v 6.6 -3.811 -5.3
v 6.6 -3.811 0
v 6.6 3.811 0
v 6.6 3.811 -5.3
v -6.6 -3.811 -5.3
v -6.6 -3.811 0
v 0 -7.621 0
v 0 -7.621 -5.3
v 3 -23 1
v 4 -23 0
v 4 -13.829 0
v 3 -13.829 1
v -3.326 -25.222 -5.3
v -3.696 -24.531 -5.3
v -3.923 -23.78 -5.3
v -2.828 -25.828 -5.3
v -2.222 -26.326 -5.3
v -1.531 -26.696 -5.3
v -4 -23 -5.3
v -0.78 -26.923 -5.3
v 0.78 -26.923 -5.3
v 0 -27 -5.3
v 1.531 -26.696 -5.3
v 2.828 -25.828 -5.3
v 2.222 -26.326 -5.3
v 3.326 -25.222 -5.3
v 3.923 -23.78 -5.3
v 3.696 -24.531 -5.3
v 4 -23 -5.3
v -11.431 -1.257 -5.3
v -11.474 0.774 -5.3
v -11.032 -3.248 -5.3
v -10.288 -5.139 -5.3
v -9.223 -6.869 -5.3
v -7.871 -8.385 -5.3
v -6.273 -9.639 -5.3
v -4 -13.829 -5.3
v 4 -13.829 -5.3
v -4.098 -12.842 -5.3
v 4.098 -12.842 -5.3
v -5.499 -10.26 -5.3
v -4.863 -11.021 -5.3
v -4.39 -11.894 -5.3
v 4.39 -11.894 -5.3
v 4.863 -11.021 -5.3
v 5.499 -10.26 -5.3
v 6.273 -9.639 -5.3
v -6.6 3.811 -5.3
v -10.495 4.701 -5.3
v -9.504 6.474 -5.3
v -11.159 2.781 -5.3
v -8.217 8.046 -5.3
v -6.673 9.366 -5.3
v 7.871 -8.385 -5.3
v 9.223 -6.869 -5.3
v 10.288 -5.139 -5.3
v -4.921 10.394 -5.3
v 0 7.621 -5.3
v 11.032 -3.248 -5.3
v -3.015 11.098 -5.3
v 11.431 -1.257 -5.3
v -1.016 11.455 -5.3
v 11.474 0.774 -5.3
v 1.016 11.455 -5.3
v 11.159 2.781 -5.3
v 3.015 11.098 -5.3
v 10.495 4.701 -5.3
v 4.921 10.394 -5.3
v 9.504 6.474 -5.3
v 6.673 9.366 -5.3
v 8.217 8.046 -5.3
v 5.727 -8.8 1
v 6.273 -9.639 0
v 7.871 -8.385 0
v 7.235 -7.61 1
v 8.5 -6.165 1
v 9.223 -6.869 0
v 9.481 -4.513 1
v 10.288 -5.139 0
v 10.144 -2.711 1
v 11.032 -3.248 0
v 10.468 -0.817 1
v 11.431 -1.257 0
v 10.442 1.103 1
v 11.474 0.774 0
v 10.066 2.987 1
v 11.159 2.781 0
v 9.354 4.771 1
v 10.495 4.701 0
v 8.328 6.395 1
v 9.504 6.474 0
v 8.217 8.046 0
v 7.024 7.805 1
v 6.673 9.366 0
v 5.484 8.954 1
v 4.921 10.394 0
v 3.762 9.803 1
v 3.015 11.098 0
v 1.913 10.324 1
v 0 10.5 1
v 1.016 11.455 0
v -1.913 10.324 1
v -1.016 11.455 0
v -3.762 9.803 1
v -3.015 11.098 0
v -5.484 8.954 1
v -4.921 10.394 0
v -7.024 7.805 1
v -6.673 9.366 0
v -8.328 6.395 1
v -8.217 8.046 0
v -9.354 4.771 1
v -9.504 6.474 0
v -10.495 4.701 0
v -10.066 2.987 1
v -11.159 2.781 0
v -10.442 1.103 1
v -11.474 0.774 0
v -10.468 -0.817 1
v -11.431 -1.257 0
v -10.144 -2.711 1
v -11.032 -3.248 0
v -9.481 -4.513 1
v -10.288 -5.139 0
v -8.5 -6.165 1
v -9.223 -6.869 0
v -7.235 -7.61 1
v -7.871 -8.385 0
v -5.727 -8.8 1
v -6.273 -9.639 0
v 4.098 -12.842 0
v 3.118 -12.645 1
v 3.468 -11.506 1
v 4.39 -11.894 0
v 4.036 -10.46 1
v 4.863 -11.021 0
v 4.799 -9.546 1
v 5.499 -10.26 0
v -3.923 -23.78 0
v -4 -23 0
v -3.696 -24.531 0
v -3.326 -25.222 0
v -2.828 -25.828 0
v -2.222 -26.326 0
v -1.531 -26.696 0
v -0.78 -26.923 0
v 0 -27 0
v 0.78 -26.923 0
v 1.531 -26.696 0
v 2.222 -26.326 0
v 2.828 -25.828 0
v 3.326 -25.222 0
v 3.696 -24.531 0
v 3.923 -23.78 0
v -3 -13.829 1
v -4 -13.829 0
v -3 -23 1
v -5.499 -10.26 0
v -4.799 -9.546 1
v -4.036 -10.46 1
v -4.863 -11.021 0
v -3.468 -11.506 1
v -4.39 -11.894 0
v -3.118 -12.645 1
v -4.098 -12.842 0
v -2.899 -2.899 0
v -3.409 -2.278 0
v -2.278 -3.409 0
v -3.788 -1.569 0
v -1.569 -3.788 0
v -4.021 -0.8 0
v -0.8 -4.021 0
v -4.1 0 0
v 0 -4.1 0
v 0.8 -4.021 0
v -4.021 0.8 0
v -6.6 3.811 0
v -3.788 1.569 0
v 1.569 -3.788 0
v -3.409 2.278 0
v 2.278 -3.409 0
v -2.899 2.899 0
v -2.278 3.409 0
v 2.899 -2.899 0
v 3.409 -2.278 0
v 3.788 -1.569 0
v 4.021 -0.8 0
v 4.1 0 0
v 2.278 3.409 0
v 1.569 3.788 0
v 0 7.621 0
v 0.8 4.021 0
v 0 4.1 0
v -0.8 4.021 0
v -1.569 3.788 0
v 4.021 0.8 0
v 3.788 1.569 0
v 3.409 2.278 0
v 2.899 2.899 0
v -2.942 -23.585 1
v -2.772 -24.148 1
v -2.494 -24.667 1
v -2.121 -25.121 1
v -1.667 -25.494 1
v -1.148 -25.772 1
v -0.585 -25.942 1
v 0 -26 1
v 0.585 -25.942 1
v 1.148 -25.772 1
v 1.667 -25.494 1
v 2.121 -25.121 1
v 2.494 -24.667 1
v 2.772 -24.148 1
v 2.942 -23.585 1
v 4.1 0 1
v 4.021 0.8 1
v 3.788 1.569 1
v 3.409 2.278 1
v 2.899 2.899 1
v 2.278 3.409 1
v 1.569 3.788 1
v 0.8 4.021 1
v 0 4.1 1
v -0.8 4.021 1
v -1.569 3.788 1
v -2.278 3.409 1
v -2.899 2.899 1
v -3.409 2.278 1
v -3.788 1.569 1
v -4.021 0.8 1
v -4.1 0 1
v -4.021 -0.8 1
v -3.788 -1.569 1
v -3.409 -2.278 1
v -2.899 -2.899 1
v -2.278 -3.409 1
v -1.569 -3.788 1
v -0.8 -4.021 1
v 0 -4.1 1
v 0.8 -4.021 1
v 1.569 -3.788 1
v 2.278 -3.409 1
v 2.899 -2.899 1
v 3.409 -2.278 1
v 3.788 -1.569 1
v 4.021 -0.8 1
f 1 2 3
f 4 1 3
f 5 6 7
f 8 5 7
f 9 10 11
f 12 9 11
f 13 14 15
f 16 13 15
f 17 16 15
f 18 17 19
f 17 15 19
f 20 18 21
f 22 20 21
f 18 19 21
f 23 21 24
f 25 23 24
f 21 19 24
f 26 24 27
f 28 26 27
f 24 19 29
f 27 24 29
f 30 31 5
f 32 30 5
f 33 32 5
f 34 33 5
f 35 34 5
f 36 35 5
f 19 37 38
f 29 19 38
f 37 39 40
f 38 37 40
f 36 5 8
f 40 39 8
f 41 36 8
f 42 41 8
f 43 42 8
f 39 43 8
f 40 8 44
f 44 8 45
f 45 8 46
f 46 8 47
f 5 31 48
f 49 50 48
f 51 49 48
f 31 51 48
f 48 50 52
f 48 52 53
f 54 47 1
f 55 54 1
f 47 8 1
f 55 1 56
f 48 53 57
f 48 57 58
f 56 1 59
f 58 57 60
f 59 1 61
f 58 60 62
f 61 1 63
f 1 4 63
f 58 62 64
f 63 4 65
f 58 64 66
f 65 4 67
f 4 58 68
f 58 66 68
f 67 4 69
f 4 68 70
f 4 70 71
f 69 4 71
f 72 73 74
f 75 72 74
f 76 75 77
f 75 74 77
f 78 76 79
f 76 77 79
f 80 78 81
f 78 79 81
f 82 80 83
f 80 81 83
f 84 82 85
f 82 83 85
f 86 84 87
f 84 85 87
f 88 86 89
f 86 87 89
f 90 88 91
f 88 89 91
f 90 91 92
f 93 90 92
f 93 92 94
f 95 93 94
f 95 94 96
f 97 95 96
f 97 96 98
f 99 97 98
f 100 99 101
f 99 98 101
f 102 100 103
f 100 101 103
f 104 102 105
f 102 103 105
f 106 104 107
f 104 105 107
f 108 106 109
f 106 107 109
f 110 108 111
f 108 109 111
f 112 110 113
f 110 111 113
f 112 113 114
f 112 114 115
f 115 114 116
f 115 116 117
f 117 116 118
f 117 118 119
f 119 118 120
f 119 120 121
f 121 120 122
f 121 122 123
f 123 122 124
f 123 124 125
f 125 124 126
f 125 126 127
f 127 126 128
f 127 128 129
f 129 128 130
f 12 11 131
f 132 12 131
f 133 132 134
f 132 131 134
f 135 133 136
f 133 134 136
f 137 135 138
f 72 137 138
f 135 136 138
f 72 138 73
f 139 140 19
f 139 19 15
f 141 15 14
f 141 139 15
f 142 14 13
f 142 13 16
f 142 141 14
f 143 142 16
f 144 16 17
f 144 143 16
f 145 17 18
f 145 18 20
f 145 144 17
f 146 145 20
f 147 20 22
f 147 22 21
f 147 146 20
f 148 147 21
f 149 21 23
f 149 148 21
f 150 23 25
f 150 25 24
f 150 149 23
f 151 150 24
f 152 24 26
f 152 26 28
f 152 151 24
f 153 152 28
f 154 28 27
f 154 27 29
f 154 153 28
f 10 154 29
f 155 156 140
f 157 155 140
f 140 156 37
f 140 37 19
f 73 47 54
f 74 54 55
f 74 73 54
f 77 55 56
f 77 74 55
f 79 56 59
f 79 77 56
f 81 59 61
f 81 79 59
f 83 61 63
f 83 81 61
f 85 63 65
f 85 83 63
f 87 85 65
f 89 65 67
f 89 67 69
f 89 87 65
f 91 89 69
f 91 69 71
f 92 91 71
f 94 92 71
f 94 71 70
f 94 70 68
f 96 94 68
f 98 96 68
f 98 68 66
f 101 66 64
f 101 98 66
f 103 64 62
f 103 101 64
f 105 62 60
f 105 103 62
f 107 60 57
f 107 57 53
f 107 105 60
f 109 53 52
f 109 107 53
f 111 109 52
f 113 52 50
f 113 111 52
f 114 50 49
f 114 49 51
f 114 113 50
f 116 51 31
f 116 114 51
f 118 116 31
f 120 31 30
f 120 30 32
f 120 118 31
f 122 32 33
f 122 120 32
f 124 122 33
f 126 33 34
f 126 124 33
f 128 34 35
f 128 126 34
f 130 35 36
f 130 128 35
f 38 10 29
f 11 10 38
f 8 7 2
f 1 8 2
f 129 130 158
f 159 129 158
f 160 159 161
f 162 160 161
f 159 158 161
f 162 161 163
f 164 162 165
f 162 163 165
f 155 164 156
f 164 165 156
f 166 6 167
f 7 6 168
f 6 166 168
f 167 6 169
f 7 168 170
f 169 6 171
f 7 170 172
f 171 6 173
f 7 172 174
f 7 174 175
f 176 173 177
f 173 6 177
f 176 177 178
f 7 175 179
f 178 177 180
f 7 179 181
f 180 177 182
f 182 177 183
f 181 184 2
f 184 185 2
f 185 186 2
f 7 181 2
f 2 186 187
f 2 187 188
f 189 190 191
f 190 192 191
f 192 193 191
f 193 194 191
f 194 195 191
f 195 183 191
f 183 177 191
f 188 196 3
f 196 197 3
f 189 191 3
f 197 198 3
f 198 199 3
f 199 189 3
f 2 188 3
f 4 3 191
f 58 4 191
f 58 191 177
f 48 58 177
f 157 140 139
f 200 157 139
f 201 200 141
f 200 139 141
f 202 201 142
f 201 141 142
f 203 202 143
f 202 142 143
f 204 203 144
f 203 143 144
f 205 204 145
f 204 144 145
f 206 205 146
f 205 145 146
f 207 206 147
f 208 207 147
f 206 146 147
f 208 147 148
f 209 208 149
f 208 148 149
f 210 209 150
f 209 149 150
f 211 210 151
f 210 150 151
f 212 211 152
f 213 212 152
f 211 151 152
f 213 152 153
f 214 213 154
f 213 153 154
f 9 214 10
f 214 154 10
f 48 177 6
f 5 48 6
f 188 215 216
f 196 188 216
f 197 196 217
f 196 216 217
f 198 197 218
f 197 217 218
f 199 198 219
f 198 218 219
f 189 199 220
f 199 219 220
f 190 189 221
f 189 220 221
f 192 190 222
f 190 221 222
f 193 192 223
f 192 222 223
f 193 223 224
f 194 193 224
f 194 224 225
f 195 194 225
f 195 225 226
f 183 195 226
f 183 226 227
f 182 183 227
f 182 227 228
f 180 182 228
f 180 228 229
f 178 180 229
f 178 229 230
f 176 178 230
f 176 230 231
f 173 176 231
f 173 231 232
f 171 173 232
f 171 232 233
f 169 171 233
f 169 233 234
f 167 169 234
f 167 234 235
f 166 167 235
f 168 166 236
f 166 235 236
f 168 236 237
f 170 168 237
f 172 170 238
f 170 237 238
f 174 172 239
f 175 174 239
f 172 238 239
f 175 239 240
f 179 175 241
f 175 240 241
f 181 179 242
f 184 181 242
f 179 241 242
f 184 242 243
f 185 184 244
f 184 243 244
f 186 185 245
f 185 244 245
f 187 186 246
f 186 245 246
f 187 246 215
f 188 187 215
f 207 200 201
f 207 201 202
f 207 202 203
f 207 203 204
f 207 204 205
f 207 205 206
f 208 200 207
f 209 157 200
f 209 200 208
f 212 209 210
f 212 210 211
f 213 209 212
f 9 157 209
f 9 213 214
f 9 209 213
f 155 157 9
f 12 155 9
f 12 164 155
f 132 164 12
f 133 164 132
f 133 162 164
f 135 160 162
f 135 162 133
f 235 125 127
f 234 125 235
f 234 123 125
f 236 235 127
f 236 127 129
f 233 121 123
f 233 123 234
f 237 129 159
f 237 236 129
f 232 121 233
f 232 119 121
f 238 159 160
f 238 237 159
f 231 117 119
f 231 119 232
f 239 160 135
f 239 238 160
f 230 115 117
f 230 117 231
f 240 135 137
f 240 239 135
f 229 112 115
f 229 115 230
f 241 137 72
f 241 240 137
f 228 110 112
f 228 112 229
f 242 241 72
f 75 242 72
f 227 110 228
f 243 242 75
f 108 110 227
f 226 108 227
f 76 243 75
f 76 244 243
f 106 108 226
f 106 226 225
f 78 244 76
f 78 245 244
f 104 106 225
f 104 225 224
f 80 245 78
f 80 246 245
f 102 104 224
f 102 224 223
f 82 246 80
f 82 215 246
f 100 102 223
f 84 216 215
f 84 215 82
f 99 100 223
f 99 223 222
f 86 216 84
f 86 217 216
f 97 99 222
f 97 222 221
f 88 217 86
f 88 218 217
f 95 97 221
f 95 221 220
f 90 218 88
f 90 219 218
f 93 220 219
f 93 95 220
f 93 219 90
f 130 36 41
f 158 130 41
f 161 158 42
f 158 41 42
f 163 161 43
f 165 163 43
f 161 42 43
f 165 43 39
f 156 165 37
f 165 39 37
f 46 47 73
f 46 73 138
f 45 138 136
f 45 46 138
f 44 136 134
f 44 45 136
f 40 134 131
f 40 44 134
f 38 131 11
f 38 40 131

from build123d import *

# Parameters (mm, degrees)
SKETCH1_R           = 11.5
BOSS_EXTRUDE1_DEPTH = 5.3
BOSS_EXTRUDE2_START = 1
SKETCH2_R           = 11.5
BOSS_EXTRUDE2_DEPTH = 1
BOSS_EXTRUDE3_DEPTH = 6.3
FILLET1_R           = 5
CHAMFER1_SIZE       = 1
CUT_EXTRUDE1_REACH  = 32.016
SKETCH4_R           = 4.1


with BuildPart() as part:
    # Sketch1 → Boss-Extrude1 (new body)
    with BuildSketch(Plane.XY):
        Circle(SKETCH1_R)
        Polygon((0, 7.621023553), (-6.6, 3.810511777), (-6.6, -3.810511777), (0, -7.621023553), (6.6, -3.810511777), (6.6, 3.810511777), align=None, mode=Mode.SUBTRACT)
    extrude(amount=-BOSS_EXTRUDE1_DEPTH)

    # Sketch2 → Boss-Extrude2 (add)
    with BuildSketch(Plane.XY.offset(BOSS_EXTRUDE2_START)):
        Circle(SKETCH2_R)
    extrude(amount=-BOSS_EXTRUDE2_DEPTH)

    # Sketch3 → Boss-Extrude3 (add)
    with BuildSketch(Plane.XY.offset(1)):
        with BuildLine():
            Line((4, -23), (4, -10.781929326))
            ThreePointArc((4, -10.781929326), (0, -11.5), (-4, -10.781929326))
            Line((-4, -10.781929326), (-4, -23))
            ThreePointArc((-4, -23), (0, -27), (4, -23))
        make_face()
    extrude(amount=-BOSS_EXTRUDE3_DEPTH)

    # Fillet1
    fillet1_edges = [part.edges().sort_by_distance(p)[0] for p in [
        (4, -10.781929326, -2.15),
        (-4, -10.781929326, -2.15),
    ]]
    fillet(fillet1_edges, radius=FILLET1_R)

    # Chamfer1
    chamfer1_edges = [part.edges().sort_by_distance(p)[0] for p in [
        (0, -27, 1),
        (0, 11.5, 1),
        (-4, -18.414658343, 1),
        (4, -18.414658343, 1),
        (-4.604754635, -11.445660213, 1),
        (4.604754635, -11.445660213, 1),
    ]]
    chamfer(chamfer1_edges, length=CHAMFER1_SIZE)

    # Sketch4 → Cut-Extrude1 (cut, up to next)
    with BuildSketch(Plane.XY.offset(1), mode=Mode.PRIVATE) as cut_extrude1_sk1:
        Circle(SKETCH4_R)
    cut_extrude1_tool1 = extrude(cut_extrude1_sk1.sketch, amount=-CUT_EXTRUDE1_REACH, mode=Mode.PRIVATE) & part.part
    add(cut_extrude1_tool1.solids().sort_by_distance((0, 0, 1))[0], mode=Mode.SUBTRACT)


solid = part.part
